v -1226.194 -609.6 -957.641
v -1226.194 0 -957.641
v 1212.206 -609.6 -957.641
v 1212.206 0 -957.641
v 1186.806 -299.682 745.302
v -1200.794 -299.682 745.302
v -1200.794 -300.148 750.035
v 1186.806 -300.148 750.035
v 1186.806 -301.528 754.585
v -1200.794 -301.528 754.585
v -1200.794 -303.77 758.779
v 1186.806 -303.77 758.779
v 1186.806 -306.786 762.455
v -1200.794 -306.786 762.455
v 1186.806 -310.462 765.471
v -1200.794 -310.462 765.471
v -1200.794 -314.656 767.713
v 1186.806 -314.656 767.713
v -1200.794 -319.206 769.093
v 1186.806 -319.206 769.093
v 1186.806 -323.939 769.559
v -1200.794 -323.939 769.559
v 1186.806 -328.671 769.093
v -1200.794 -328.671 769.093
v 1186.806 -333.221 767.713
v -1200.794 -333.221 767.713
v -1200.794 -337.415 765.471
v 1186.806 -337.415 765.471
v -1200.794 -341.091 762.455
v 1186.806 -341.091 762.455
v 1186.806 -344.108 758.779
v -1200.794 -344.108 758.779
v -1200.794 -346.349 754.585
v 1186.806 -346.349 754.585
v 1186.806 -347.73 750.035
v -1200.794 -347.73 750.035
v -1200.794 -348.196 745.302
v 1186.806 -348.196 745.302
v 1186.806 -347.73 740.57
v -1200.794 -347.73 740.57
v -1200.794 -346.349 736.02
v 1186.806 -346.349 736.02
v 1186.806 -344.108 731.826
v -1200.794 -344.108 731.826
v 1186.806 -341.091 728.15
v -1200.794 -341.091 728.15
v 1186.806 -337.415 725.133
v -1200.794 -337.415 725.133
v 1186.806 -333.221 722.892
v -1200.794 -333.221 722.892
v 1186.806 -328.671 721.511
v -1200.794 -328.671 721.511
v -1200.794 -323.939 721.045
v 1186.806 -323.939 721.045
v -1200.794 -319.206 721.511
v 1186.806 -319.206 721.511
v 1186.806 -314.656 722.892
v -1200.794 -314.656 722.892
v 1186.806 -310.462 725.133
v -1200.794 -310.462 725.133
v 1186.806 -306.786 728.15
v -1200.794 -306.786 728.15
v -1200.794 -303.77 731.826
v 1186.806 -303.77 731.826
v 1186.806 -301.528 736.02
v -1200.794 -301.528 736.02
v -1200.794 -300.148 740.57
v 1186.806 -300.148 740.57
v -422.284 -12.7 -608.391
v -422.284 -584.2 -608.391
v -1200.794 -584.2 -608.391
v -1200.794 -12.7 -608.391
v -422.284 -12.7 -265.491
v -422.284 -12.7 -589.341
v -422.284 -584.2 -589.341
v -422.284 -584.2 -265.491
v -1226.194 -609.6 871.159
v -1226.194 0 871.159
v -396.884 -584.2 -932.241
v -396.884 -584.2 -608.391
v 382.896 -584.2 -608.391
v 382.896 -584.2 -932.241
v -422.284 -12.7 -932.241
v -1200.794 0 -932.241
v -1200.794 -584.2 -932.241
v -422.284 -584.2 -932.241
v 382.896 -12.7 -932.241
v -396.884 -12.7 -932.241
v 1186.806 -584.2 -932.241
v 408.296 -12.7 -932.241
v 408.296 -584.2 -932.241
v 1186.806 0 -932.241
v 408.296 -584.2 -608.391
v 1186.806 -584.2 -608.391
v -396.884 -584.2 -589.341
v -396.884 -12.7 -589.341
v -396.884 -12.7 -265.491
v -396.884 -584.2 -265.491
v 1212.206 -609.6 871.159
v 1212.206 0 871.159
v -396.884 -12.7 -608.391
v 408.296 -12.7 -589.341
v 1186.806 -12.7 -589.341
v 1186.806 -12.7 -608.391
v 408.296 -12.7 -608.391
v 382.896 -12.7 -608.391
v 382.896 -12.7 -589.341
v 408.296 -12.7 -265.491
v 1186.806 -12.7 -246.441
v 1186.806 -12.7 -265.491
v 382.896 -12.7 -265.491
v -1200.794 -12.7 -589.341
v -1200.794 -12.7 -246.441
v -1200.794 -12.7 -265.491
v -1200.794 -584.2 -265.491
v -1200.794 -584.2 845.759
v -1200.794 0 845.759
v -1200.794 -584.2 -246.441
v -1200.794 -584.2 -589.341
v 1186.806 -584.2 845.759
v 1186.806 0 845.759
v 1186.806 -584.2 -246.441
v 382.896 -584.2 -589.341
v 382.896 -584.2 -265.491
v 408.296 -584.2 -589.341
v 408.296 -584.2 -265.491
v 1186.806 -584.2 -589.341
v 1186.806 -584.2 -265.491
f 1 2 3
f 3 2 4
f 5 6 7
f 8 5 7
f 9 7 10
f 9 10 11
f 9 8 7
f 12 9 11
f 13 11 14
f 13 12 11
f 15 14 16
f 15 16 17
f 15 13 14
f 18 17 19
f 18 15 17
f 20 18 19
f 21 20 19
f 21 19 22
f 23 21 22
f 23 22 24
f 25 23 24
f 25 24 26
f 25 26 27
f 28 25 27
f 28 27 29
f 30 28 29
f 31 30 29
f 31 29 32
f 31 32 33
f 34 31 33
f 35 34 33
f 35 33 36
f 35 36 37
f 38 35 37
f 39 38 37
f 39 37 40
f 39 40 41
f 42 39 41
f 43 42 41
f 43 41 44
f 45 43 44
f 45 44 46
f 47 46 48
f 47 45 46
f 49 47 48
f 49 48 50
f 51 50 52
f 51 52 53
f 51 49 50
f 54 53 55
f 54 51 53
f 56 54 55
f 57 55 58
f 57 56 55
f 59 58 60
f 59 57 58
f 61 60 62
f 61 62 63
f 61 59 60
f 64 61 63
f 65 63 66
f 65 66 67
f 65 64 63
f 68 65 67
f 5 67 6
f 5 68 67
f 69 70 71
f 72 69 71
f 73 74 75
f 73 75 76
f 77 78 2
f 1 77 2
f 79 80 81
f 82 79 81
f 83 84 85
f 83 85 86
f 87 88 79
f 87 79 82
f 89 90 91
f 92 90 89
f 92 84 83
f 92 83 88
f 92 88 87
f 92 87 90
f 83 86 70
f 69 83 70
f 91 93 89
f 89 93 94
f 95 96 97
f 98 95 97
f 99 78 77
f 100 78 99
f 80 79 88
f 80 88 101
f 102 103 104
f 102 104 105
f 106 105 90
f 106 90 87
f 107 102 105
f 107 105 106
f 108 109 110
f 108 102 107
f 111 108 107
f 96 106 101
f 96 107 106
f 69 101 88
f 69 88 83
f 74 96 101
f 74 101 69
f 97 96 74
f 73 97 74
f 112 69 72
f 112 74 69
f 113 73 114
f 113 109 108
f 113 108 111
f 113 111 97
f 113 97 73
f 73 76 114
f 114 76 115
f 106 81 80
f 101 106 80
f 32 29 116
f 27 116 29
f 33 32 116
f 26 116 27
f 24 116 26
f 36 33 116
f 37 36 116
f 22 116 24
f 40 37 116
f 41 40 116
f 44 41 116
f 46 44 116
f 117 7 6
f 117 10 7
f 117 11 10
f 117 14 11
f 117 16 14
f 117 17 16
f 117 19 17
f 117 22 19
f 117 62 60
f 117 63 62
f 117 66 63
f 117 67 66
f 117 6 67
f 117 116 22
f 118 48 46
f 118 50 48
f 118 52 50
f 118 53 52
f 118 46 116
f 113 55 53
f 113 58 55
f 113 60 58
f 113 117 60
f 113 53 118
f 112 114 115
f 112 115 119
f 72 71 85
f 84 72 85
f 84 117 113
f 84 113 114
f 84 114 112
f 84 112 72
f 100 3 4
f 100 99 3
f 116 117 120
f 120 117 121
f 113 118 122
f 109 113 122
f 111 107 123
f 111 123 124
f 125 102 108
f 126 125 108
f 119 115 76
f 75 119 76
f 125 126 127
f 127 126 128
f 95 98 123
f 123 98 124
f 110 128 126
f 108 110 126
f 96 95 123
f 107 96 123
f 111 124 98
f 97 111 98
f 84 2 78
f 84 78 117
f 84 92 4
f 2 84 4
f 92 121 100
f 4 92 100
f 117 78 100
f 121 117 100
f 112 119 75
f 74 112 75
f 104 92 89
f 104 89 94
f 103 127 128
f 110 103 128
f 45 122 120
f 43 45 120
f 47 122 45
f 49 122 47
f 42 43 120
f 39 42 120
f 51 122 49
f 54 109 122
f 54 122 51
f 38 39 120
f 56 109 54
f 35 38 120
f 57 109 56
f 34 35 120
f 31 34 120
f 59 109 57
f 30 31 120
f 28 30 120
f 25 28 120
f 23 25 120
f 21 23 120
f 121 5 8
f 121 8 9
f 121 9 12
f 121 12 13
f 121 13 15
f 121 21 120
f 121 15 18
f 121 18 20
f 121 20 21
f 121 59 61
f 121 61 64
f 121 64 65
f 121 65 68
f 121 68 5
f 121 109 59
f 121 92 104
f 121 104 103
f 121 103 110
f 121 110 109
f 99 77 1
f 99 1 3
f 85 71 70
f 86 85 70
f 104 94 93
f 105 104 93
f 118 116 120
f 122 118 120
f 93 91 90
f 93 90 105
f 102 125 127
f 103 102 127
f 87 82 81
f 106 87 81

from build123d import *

# Parameters (mm, degrees)
F0_W     = 2438.4
F0_H     = 1219.2
F0_H_2   = 304.8
F1_DEPTH = 609.6
F2_T     = -25.4
F3_W     = 25.4
F3_H     = 323.85
F4_DEPTH = 571.5
F5_R     = 24.257
F6_DEPTH = 2438.4


with BuildPart() as f1:
    # F0 (on Front) → F1 (new body)
    with BuildSketch(Plane.XZ):
        with Locations((-6.99388, 261.559361)):
            Rectangle(F0_W, F0_H)
        with Locations((-6.99388, -500.440639)):
            Rectangle(F0_W, F0_H_2)
        with Locations((-6.99388, -805.240639)):
            Rectangle(F0_W, F0_H_2)
    extrude(amount=F1_DEPTH)

    # F2
    f2_openings = [f1.faces().sort_by_distance(p)[0] for p in [
        (-6.99388, 0, -43.240639),
    ]]
    offset(amount=F2_T, openings=f2_openings)

    # F3 (on face) → F4 (join)
    with BuildSketch(Plane(origin=(0, -584.2, 0), x_dir=(-1, 0, 0), z_dir=(0, 1, 0))):
        Polygon((-408.29612, -589.340639), (-1186.80612, -589.340639), (-1186.80612, -608.390639), (-408.29612, -608.390639), (-382.89612, -608.390639), (396.88388, -608.390639), (422.28388, -608.390639), (1200.79388, -608.390639), (1200.79388, -589.340639), (422.28388, -589.340639), (396.88388, -589.340639), (-382.89612, -589.340639), align=None)
        with Locations((-395.59612, -427.415639)):
            Rectangle(F3_W, F3_H)
        Polygon((-1186.80612, -265.490639), (-408.29612, -265.490639), (-382.89612, -265.490639), (396.88388, -265.490639), (422.28388, -265.490639), (1200.79388, -265.490639), (1200.79388, -246.440639), (-1186.80612, -246.440639), align=None)
        with Locations((-395.59612, -770.315639)):
            Rectangle(F3_W, F3_H)
        with Locations((409.58388, -427.415639)):
            Rectangle(F3_W, F3_H)
        with Locations((409.58388, -770.315639)):
            Rectangle(F3_W, F3_H)
    extrude(amount=F4_DEPTH)

    # F5 (on face) → F6 (join)
    with BuildSketch(Plane.YZ.offset(1212.20612)):
        with Locations((-323.938608, 745.302361)):
            Circle(F5_R)
    extrude(amount=-F6_DEPTH)


solid = f1.part
